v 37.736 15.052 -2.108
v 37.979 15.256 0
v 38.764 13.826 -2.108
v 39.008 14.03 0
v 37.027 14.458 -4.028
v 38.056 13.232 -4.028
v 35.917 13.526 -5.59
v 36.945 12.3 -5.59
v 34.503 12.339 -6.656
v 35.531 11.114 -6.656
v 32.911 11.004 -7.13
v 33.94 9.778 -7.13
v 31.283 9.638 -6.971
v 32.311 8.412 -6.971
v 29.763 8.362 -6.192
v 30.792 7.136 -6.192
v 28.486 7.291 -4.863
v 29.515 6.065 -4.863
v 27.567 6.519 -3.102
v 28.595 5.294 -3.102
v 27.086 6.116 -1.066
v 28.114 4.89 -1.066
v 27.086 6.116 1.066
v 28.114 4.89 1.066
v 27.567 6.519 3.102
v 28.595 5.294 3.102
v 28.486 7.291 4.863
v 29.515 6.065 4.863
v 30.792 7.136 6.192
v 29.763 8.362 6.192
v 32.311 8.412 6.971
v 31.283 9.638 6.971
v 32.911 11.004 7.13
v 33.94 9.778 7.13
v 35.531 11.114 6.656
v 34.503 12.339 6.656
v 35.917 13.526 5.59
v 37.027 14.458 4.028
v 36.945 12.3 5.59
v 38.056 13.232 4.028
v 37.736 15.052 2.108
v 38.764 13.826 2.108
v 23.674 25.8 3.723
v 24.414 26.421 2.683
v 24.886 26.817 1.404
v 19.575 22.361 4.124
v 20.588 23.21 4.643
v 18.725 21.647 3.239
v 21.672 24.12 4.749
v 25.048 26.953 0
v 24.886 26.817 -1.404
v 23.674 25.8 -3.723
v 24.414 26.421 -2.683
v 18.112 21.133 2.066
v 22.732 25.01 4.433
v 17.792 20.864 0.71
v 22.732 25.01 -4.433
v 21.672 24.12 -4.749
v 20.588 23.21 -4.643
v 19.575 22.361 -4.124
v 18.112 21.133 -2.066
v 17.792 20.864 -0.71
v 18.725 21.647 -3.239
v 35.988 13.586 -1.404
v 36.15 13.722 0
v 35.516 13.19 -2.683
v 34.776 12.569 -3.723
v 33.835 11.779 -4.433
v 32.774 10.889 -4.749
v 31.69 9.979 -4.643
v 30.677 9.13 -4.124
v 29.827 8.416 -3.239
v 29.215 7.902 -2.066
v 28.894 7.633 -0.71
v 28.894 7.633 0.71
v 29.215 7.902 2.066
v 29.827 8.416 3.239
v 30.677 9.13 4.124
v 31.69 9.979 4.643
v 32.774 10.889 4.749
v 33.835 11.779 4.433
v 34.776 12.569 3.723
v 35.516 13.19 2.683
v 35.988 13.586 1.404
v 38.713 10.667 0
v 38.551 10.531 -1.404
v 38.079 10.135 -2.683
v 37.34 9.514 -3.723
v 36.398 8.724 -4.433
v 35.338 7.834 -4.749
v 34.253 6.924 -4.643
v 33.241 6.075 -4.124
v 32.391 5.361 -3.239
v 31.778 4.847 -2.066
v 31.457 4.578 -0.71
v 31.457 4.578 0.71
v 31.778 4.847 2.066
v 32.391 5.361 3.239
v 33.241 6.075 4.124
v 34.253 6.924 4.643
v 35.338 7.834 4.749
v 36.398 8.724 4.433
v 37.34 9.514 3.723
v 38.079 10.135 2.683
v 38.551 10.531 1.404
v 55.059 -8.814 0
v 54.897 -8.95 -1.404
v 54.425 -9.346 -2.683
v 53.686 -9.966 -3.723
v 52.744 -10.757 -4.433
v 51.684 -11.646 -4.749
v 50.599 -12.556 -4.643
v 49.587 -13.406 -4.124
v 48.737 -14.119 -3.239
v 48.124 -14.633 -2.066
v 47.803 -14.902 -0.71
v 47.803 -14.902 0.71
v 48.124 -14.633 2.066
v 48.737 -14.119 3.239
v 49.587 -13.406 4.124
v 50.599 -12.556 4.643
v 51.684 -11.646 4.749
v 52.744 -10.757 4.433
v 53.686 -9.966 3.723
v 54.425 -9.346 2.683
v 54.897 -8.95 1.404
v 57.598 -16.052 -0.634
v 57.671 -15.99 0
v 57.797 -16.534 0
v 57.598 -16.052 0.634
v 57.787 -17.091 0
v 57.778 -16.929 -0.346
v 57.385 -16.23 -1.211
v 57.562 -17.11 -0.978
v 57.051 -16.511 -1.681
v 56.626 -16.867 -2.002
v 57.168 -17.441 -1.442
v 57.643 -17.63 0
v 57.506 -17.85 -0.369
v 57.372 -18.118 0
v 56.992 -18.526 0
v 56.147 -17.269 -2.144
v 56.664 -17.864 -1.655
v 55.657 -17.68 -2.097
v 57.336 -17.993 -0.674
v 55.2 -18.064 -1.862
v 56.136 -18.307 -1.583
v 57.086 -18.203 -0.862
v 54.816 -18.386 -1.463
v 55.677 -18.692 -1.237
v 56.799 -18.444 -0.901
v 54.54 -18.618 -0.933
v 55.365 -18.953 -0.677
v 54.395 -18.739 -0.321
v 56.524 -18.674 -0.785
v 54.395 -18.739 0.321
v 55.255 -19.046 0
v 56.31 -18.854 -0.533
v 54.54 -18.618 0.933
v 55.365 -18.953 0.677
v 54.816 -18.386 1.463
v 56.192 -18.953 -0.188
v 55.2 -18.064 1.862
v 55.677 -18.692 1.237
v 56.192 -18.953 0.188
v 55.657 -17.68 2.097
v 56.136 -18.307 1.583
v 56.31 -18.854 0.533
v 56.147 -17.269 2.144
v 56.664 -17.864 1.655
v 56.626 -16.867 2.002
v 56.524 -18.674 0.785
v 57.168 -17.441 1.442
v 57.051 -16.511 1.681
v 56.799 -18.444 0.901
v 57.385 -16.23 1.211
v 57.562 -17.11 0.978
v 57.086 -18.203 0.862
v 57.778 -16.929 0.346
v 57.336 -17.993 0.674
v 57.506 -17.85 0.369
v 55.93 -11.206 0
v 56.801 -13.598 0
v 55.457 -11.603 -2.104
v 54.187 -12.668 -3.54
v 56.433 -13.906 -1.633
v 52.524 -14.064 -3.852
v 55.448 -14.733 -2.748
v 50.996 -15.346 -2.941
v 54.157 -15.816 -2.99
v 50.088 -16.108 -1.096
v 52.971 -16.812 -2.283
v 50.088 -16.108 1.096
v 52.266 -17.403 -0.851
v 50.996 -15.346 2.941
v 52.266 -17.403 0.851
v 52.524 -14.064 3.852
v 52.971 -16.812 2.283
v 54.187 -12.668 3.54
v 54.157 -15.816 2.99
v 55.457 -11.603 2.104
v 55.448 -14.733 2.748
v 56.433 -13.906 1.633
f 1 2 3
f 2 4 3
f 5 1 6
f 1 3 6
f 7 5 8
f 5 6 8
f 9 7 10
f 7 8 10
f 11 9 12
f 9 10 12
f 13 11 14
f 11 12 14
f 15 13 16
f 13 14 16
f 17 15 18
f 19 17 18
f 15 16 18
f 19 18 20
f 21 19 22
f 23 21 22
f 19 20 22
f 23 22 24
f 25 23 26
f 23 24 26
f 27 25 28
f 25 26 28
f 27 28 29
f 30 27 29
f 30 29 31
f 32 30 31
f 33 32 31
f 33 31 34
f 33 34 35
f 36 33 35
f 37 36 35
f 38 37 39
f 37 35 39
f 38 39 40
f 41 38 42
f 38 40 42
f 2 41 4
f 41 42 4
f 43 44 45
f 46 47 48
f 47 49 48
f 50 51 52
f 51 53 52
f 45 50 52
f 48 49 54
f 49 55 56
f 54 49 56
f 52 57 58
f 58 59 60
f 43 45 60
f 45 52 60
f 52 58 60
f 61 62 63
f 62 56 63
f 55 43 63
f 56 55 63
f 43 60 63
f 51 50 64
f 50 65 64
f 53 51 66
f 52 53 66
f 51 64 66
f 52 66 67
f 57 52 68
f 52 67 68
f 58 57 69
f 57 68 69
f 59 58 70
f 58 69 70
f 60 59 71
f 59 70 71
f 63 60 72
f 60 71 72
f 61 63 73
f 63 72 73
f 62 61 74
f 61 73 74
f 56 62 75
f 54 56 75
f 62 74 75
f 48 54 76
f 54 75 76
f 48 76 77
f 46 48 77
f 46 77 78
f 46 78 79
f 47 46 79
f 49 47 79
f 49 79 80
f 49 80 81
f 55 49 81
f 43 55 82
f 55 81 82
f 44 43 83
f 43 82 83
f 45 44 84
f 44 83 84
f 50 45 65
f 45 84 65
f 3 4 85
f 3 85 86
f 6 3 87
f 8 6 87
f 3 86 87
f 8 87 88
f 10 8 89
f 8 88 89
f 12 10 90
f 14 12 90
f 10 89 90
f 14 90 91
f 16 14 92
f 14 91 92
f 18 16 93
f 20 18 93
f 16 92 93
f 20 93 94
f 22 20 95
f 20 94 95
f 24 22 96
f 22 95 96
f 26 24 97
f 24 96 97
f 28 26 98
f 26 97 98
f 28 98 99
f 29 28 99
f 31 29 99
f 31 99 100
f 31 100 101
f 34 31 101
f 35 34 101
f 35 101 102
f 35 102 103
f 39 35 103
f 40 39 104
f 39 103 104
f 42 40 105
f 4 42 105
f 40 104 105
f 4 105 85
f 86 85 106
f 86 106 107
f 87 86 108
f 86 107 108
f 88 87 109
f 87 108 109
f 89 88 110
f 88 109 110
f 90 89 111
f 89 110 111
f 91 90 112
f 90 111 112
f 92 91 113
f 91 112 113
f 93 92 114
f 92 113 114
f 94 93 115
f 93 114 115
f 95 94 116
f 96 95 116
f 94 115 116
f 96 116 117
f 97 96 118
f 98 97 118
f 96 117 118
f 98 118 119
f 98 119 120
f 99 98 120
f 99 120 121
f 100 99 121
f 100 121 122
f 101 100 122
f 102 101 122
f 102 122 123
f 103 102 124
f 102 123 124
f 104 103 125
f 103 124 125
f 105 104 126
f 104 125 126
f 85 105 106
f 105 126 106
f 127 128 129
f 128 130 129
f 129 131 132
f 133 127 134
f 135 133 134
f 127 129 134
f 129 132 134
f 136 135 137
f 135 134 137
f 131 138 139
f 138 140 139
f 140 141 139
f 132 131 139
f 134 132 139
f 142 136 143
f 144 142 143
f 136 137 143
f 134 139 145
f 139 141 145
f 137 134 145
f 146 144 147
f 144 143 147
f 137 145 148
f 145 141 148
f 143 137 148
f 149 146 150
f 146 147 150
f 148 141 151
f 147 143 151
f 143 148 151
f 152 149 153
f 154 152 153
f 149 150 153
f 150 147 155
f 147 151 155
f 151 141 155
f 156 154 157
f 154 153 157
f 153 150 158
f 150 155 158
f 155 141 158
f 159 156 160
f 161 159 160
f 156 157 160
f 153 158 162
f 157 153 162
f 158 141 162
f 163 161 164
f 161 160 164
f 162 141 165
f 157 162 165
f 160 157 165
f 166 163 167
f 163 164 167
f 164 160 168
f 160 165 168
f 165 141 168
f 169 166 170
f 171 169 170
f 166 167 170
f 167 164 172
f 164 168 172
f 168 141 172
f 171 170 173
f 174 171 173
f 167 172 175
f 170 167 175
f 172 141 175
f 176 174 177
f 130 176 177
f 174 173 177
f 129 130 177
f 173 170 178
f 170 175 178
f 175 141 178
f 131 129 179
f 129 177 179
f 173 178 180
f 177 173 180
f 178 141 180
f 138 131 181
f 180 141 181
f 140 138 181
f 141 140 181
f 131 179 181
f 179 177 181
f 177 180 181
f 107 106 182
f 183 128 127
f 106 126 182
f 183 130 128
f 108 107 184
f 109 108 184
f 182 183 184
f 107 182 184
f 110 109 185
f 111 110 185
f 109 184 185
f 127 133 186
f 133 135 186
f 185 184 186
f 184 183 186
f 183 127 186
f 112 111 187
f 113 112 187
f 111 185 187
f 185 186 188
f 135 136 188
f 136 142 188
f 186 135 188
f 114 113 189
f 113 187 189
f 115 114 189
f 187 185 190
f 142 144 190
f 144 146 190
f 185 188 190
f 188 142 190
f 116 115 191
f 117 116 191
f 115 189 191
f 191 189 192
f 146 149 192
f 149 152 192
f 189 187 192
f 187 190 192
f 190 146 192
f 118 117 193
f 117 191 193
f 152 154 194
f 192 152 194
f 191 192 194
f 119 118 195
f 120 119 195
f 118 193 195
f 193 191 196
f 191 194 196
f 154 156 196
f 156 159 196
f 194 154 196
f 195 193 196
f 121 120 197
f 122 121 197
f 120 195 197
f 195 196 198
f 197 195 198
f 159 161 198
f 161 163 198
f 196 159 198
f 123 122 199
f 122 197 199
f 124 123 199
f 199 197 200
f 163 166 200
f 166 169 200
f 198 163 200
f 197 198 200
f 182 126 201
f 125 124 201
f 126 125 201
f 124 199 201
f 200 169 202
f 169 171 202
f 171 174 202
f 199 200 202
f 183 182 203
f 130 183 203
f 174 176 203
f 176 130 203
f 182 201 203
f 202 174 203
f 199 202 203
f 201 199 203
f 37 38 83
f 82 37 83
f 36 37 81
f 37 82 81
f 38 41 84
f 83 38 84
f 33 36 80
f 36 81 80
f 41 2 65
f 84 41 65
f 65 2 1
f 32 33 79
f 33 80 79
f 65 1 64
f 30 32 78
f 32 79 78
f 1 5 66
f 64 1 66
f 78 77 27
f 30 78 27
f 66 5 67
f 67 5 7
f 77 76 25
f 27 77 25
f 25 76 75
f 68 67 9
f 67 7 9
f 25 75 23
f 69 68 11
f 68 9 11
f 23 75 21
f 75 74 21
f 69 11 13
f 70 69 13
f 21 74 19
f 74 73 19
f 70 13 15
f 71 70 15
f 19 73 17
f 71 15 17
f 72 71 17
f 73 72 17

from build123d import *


with BuildPart() as part:
    # Sketch2 → Revolve1 (revolve)
    with BuildSketch(Plane.XY):
        with BuildLine():
            Line((25.047699583, 26.952680264), (36.149927178, 13.721560642))
            Line((36.149927178, 13.721560642), (37.97893489, 15.256280339))
            Line((37.97893489, 15.256280339), (39.007523623, 14.030456021))
            Line((39.007523623, 14.030456021), (38.713235608, 10.666728612))
            Line((38.713235608, 10.666728612), (55.059298025, -8.813749999))
            Line((55.059298025, -8.813749999), (57.671314579, -15.990206501))
            ThreePointArc((57.671314579, -15.990206501), (57.731349183, -17.365224991), (56.991848446, -18.526008632))
            Line((56.991848446, -18.526008632), (21.399412923, 23.891404273))
            Line((21.399412923, 23.891404273), (25.047699583, 26.952680264))
        make_face()
    revolve(axis=Axis((56.991848446, -18.526008632, 0), (-0.6427876096865393, 0.7660444431189782, 0)))


solid = part.part
